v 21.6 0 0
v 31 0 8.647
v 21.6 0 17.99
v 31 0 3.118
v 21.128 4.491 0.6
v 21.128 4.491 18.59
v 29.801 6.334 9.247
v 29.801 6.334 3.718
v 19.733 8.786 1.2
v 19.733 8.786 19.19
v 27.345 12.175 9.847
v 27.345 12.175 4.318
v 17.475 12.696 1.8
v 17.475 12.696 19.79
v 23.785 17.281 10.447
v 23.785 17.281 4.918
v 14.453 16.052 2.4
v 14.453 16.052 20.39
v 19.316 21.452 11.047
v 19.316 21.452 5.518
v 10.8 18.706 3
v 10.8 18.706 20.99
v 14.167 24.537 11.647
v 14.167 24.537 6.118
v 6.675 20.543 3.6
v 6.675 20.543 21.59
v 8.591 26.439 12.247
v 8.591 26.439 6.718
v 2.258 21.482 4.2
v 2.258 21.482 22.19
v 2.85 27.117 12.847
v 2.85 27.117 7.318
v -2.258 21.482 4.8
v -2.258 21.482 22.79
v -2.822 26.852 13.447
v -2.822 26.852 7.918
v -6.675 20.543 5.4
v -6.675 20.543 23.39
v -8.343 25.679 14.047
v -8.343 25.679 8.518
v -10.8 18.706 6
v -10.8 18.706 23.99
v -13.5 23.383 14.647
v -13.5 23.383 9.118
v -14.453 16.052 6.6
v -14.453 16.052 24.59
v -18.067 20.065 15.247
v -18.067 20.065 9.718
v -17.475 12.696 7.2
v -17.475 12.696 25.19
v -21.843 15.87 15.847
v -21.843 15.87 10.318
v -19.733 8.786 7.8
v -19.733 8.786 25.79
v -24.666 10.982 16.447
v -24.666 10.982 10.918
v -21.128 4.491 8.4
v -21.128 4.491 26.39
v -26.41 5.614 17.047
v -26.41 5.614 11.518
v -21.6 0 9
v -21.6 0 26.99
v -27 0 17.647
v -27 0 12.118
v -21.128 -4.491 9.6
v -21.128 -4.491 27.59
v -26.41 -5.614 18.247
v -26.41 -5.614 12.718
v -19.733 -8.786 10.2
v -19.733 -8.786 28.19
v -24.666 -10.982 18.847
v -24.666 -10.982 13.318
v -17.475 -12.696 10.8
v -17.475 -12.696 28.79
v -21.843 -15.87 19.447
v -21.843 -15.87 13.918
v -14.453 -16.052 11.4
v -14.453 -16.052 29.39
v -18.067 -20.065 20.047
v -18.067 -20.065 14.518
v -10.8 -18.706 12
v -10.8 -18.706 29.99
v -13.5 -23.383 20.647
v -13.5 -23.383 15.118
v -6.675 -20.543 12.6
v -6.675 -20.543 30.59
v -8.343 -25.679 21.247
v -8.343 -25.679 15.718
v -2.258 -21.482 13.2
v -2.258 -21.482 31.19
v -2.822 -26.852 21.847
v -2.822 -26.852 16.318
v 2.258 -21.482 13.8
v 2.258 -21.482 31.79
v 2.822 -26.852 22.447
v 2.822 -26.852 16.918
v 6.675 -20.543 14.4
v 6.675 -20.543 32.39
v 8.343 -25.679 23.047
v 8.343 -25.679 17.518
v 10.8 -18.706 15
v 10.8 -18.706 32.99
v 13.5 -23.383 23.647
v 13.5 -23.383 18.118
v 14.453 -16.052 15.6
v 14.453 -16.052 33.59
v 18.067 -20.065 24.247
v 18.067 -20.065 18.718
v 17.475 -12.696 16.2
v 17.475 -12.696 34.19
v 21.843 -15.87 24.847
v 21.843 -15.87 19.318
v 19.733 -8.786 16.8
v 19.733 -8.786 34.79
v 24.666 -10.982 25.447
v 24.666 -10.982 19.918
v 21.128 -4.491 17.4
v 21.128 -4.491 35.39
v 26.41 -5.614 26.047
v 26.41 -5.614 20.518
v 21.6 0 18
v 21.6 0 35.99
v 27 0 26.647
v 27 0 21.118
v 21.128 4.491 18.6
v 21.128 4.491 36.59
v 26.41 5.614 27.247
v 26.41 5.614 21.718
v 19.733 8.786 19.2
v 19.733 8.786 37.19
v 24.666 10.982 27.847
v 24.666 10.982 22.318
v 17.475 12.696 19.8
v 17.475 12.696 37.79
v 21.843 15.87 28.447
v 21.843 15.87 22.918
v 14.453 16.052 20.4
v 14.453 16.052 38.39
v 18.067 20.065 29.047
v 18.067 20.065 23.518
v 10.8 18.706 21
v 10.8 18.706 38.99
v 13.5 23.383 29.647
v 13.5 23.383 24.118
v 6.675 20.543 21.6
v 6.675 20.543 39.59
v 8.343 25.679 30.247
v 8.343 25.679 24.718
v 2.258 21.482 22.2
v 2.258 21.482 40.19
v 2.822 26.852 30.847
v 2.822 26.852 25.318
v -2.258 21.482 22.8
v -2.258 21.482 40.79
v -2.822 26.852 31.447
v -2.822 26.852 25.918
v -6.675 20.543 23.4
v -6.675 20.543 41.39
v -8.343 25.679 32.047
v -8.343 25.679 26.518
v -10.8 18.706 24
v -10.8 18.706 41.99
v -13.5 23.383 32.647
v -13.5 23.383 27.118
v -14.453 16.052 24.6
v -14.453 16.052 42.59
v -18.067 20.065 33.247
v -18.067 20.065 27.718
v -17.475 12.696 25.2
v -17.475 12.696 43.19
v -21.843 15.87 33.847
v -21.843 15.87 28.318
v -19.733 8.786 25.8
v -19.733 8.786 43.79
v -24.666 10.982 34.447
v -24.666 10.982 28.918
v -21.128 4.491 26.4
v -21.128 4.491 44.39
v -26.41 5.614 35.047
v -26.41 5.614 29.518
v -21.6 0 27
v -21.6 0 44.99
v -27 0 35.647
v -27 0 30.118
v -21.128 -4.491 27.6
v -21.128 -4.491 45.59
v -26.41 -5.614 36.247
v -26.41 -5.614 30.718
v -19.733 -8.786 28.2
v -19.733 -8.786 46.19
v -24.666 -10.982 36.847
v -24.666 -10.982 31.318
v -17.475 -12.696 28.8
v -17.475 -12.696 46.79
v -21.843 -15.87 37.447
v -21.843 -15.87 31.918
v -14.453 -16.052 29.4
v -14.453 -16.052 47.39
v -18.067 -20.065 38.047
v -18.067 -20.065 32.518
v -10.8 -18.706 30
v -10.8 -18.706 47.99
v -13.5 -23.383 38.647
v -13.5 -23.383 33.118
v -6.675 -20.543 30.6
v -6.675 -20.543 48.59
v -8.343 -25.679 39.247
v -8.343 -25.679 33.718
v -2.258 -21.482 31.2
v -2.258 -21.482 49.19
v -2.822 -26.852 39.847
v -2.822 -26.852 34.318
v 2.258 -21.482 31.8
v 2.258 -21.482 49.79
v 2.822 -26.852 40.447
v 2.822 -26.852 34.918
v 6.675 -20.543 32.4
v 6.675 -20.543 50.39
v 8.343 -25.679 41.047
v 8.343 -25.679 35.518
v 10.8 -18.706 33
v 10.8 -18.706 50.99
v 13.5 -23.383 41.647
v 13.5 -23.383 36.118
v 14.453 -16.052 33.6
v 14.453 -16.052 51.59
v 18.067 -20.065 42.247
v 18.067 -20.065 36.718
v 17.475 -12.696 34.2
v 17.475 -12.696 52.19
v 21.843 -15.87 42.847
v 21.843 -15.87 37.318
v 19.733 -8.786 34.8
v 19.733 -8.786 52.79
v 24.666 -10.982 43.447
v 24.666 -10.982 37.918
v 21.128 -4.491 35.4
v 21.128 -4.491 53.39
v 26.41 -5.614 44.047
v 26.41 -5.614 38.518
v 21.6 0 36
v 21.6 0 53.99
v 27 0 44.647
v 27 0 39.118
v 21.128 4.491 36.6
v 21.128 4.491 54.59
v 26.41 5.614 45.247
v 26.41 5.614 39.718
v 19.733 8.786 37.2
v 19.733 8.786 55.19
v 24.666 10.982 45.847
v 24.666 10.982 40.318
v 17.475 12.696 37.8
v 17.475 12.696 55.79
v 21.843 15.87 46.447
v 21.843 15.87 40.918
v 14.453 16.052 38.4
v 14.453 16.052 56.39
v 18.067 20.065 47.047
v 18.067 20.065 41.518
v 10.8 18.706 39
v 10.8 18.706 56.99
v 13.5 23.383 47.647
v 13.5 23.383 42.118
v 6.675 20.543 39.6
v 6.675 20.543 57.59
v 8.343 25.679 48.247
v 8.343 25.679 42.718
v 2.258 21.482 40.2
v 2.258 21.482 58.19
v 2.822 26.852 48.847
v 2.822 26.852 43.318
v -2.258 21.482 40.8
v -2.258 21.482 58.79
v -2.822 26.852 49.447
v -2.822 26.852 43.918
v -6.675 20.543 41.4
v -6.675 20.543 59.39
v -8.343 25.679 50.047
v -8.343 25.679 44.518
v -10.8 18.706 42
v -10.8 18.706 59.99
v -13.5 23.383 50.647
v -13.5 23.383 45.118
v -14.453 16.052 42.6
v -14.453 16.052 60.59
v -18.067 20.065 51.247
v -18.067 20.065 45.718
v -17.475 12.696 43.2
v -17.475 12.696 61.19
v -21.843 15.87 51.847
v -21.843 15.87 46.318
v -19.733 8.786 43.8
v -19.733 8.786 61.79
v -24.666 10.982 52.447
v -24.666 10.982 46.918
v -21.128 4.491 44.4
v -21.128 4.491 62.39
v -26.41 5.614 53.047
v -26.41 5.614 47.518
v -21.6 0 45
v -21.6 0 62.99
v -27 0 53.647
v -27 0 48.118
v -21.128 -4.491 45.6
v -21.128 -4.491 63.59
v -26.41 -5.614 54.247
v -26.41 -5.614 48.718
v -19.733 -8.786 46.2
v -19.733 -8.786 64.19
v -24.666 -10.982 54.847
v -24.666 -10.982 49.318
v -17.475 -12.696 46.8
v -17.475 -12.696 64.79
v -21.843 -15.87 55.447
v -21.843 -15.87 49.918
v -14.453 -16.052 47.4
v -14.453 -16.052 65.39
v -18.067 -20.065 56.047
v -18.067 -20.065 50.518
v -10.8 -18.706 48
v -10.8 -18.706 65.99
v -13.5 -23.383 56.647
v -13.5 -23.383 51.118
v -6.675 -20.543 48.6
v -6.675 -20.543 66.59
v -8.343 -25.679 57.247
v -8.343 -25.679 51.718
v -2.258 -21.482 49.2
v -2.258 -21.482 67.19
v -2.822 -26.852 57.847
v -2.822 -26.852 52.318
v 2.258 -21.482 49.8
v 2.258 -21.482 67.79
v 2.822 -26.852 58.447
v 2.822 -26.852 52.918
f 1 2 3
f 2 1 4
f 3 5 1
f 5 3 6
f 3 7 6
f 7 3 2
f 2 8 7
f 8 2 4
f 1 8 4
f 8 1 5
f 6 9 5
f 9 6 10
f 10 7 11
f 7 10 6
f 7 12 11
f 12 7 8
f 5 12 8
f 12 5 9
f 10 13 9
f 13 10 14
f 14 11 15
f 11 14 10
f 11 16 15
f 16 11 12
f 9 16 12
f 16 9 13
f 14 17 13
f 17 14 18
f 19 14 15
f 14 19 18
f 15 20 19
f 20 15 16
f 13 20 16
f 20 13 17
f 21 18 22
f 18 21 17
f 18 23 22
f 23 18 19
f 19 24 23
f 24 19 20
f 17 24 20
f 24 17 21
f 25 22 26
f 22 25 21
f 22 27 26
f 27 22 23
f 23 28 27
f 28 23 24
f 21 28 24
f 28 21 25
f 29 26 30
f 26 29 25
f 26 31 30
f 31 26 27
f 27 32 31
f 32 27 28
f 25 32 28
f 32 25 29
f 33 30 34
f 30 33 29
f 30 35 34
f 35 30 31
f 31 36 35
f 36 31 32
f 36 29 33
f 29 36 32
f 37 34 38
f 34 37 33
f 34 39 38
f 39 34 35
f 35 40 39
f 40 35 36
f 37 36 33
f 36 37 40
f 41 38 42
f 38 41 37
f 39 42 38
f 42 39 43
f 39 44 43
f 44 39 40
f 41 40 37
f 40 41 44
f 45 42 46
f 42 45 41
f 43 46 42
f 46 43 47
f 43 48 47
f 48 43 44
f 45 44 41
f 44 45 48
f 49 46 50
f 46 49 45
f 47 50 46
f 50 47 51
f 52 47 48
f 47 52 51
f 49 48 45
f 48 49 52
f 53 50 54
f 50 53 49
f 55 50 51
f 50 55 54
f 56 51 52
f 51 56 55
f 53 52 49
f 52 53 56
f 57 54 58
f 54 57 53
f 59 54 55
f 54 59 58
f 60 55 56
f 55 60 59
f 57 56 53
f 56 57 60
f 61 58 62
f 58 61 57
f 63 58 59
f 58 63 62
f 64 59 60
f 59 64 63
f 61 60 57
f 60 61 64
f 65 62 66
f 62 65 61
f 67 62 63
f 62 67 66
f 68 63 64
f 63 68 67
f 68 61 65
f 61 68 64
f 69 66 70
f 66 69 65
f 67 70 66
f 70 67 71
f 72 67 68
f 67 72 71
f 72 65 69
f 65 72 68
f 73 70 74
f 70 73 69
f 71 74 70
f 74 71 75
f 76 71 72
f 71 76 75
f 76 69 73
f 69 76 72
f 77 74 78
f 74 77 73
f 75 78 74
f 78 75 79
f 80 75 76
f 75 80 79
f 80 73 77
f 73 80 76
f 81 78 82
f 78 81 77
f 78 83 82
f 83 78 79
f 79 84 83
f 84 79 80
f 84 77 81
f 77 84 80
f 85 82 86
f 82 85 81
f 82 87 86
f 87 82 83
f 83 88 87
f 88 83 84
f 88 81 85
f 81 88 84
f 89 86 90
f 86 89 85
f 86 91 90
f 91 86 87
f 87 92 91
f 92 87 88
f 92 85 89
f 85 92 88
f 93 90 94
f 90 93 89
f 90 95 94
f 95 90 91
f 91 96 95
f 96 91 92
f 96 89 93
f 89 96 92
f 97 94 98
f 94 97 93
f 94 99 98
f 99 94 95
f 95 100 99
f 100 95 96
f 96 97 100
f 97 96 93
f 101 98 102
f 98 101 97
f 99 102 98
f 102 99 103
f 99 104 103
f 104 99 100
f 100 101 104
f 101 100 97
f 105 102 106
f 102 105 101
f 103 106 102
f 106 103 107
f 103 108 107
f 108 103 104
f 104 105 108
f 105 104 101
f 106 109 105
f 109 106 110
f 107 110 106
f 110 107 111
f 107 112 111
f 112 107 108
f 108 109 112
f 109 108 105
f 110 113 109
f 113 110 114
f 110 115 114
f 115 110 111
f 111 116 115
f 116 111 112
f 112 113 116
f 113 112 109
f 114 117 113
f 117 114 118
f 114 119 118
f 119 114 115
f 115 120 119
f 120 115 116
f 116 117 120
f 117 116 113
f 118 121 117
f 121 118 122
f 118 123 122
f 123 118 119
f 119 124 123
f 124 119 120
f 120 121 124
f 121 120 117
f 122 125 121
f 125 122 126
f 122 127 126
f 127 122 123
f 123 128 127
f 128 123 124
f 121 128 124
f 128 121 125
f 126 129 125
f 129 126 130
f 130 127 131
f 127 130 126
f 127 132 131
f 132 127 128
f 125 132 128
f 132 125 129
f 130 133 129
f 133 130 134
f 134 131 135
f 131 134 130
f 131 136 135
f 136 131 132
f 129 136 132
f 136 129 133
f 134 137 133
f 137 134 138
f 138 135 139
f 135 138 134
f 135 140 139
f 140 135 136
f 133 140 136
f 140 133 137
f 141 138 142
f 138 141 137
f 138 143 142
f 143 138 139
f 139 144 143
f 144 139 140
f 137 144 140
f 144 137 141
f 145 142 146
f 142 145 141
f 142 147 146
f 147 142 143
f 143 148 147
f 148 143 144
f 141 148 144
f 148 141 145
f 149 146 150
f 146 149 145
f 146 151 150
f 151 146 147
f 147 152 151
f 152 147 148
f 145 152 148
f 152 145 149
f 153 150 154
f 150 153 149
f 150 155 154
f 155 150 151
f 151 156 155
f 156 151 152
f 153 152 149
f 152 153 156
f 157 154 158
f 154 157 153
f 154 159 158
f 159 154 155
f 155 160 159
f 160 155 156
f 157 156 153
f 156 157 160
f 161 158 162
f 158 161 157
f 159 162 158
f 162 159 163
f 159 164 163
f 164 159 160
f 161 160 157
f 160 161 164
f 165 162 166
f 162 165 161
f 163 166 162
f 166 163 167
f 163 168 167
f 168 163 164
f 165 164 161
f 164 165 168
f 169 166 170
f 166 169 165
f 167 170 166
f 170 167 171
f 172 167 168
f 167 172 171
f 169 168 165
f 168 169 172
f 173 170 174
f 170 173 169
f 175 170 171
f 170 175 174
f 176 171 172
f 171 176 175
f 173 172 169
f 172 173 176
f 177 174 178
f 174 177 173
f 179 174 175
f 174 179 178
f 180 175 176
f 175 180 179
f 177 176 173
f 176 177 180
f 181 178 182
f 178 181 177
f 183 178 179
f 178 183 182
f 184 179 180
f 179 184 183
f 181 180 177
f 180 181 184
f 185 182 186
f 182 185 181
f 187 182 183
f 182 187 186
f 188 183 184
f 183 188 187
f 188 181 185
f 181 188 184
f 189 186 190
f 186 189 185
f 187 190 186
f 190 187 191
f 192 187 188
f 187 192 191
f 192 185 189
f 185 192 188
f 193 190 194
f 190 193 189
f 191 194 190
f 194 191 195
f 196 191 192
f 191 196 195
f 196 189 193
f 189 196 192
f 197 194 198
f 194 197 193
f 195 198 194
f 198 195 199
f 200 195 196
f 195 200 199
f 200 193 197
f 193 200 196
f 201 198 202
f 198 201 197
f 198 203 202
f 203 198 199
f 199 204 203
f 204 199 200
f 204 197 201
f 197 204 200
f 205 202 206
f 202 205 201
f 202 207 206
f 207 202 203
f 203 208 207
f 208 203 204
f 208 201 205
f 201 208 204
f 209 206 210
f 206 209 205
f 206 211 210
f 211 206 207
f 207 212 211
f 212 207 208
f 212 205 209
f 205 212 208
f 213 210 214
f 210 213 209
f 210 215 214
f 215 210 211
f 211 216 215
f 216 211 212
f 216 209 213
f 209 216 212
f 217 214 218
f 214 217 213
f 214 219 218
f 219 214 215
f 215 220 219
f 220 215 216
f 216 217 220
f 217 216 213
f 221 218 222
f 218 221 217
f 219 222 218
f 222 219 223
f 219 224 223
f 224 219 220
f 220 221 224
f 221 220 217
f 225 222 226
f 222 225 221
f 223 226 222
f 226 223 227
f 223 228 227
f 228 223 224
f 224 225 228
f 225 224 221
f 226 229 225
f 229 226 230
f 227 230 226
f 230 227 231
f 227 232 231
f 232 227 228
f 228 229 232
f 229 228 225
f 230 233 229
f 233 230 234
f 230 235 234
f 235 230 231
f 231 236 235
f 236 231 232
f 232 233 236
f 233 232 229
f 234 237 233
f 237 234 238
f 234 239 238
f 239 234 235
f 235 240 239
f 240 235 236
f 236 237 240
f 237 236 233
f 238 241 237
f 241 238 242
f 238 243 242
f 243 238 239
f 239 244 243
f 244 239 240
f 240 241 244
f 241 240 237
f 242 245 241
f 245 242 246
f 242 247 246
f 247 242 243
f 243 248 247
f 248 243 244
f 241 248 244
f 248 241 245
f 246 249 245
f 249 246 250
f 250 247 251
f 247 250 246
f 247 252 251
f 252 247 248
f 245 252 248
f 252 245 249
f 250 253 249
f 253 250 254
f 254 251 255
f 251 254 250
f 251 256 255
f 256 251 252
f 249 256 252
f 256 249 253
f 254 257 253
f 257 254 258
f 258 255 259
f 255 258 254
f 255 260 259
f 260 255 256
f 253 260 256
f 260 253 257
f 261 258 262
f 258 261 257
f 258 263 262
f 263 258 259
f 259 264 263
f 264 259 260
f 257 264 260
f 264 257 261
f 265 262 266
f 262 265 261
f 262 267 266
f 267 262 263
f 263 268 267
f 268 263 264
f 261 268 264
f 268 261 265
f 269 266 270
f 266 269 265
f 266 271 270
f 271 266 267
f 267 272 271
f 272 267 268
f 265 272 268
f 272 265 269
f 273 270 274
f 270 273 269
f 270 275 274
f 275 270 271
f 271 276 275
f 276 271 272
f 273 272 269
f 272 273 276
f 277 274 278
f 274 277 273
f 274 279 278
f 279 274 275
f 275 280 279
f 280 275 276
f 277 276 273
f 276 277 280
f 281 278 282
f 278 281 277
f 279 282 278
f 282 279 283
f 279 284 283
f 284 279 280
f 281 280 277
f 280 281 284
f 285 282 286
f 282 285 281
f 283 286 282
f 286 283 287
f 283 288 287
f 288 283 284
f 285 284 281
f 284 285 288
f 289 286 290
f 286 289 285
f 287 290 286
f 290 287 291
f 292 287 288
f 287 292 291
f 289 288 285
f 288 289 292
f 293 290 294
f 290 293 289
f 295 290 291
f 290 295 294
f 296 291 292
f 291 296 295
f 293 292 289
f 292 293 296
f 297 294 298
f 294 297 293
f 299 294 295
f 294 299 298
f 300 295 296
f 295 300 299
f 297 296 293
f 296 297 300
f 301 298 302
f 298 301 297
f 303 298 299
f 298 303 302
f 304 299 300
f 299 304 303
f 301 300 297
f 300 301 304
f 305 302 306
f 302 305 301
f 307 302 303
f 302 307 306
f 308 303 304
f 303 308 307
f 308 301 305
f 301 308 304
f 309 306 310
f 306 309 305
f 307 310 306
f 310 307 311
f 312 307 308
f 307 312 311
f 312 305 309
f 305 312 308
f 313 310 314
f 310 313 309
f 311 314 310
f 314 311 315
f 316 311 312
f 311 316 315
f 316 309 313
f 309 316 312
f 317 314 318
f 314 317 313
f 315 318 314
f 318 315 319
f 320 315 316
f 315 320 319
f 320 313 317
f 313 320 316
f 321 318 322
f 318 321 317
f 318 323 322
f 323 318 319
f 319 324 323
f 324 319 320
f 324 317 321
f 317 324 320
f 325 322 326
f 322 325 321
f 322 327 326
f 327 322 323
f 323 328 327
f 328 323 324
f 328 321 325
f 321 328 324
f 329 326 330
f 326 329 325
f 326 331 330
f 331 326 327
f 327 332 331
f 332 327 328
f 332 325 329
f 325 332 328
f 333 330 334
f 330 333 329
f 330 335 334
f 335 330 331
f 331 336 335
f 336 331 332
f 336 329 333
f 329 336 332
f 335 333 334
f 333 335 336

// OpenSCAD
/*
  r = Außenradius
*/

module rinne (r, h, t, pitch, dr = 4, alpha = 90, fn = 20)
{
  // dr: Offsett von r am Anfang bis alpha
  space = 0.01;   // Abstand der Bahnen in z (dürfen nicht überlappen)

  ri = r - t;
  points=[
        for(a=[0:360/fn:h/pitch*360])(
         let(ro = (a < alpha)? dr - dr * a/alpha : 0,
             profile = [[0, 0],
                       [0, pitch - space],    
                       [t+ro, pitch - tan(60) * t],      
                       [t+ro, tan(30) * t]])
            for(p=[0:len(profile)-1])(
                [
                    (profile[p][0]+ri)*cos(a),
                    (profile[p][0]+ri)*sin(a),
                     profile[p][1]+a/360*pitch
                ]
            )
        )   
    ];

	n=4;
	p=len(points);
	faces=[
        [for(point=[0:1:n-1])
            point
        ],
        for(point=[0:n:p-n-1])(
            for(side=[0:n-1])(
                let(offset1=point+side,offset2=n)[
                    offset1,
                    offset1+offset2,
                    (side==n-1?
                        offset1+1
                    :
                        offset1+offset2+1
                    ),
                    (side==n-1?
                        offset1-offset2+1
                    :
                        offset1+1
                    )
                ]
                
            )
        ),
        [for(point=[p-1:-1:p-n])
            point,
        ]
    ];

  polyhedron(points,faces,10);
  //cylinder (r = ri + 0.01, h = h + pitch - space);
}


rinne (r = 27, h = 50, t = 5.4, pitch = 18, dr = 4,  alpha = 90, fn = 30);
